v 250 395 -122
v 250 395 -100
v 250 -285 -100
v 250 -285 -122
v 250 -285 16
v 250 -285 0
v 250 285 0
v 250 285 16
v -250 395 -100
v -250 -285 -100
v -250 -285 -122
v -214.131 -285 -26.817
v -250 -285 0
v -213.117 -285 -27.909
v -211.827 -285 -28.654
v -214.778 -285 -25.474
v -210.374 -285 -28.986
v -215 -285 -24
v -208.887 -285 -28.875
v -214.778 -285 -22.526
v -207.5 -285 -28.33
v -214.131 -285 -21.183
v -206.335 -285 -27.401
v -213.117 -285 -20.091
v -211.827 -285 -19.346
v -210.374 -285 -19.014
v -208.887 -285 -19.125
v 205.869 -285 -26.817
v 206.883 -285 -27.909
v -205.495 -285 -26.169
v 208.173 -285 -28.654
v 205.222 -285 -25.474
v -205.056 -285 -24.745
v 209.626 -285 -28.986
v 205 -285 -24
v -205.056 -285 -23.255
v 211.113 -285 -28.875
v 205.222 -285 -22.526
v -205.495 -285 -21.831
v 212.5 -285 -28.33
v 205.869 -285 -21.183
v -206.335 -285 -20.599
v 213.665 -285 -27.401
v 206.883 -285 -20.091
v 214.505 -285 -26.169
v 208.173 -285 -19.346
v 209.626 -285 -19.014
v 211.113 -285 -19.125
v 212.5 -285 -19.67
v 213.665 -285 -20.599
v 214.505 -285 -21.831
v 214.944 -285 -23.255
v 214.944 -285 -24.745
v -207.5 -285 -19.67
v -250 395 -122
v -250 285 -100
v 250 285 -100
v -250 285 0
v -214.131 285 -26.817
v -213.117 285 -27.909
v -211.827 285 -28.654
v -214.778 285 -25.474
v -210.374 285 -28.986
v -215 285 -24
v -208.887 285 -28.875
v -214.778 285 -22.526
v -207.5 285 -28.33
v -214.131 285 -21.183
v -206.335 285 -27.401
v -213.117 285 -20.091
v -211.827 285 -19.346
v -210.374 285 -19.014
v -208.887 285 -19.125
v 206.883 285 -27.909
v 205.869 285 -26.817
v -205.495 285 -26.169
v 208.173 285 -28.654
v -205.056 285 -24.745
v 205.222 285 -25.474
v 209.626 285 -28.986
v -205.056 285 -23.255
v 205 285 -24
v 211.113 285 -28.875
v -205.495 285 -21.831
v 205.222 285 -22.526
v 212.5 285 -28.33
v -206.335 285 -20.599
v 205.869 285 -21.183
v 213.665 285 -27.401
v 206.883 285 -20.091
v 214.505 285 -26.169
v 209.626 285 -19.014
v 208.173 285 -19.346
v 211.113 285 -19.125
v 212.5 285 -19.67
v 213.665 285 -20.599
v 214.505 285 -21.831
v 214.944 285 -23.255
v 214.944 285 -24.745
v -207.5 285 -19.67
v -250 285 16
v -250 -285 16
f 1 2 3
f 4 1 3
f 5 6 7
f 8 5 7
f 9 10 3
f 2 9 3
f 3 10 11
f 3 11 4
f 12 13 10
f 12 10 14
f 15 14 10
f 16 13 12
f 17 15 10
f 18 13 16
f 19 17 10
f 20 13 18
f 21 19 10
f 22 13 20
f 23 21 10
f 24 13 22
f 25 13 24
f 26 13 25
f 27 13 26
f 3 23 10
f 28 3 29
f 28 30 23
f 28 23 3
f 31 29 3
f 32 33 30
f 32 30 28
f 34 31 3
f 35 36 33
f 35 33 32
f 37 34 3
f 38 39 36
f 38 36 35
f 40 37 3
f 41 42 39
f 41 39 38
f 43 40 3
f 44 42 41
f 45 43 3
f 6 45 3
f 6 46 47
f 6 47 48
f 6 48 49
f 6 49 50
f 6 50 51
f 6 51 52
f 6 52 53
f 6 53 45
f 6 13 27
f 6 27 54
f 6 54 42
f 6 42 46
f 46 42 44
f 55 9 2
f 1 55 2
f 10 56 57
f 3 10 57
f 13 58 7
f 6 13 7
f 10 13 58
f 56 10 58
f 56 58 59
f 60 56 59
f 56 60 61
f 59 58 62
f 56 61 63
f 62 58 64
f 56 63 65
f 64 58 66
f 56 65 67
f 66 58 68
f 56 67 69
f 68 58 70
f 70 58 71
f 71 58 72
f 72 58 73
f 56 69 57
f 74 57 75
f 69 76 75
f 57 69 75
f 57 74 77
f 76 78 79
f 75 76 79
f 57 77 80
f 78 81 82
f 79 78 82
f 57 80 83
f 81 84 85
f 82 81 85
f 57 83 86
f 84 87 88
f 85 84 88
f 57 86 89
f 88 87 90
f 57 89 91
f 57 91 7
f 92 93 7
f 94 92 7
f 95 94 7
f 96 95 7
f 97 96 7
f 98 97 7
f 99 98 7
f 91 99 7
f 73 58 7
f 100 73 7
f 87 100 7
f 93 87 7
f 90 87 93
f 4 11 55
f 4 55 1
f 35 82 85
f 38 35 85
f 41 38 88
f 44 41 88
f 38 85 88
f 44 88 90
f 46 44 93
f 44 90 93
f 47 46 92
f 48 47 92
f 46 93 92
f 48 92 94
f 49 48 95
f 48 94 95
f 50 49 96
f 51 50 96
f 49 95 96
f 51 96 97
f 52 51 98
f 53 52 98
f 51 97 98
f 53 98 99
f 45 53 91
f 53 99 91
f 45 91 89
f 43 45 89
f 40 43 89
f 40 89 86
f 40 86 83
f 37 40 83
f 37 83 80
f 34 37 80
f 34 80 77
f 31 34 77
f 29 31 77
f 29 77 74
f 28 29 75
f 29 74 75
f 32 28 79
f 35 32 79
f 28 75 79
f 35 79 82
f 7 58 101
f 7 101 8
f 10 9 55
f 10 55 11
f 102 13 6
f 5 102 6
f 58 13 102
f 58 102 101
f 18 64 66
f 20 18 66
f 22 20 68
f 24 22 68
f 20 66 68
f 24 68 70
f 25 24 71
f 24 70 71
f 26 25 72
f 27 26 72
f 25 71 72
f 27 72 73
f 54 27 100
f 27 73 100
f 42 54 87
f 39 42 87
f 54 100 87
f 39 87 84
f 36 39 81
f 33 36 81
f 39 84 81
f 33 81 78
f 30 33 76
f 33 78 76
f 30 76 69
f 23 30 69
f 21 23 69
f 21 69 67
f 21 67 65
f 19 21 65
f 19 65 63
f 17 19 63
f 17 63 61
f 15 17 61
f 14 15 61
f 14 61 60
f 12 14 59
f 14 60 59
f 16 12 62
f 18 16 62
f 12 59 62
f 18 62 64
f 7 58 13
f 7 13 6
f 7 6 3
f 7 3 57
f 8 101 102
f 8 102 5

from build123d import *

# Parameters (mm, degrees)
F0_W     = 500
F0_H     = 570
F1_DEPTH = 16
F2_DEPTH = 100
F3_W     = 500
F3_H     = 680
F4_DEPTH = 22
F5_R     = 5
F6_DEPTH = 570


with BuildPart() as f1:
    # F0 (on Top) → F1 (new body)
    with BuildSketch(Plane.XY):
        Rectangle(F0_W, F0_H)
    extrude(amount=F1_DEPTH)


with BuildPart() as f2:
    # F0 (on Top) → F2 (new body)
    with BuildSketch(Plane.XY):
        Rectangle(F0_W, F0_H)
    extrude(amount=-F2_DEPTH)

    # F5 (on face) → F6 (cut, through all)
    with BuildSketch(Plane(origin=(0, 285, 0), x_dir=(-1, 0, 0), z_dir=(0, 1, 0))):
        with Locations((-210, -24)):
            Circle(F5_R)
        with Locations((210, -24)):
            Circle(F5_R)
    extrude(amount=-F6_DEPTH, mode=Mode.SUBTRACT)


with BuildPart() as f4:
    # F3 (on face) → F4 (new body)
    with BuildSketch(Plane(origin=(0, 0, -100), x_dir=(1, 0, 0), z_dir=(0, 0, -1))):
        with Locations((0, -55)):
            Rectangle(F3_W, F3_H)
    extrude(amount=F4_DEPTH)


solid = Compound([f1.part, f2.part, f4.part])
